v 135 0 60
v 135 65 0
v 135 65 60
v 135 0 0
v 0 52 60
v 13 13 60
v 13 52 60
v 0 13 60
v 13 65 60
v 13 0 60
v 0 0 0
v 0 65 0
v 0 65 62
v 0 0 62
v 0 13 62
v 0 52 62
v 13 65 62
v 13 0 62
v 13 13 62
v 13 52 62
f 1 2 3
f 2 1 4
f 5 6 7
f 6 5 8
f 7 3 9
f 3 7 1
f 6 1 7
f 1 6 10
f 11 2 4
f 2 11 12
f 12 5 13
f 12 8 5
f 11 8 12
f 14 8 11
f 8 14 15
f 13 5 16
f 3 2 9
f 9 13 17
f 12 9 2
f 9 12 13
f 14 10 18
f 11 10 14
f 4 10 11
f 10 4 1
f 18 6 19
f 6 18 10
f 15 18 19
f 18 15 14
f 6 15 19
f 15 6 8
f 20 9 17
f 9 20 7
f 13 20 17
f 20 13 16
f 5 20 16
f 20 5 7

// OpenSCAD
module battery(V=12, AH=7.5) {
    if ((V==12) && (AH==7.5)) {
        color([1,1,1]*0.2) 
            cube([145,65,95]);
        translate([0,0,95])
            color([1,0,0])
                cube([13,13,2]);
        translate([0,65-13,95])
            color([0,0,0])
                cube([13,13,2]);
        name = "Probattery 12V 7.5AH";
        color([1,1,1]) {
            translate([5,0,75]) {
                translate([0,0,0])
                    rotate(90, [1,0,0])
                        text(name);
                translate([130,65,0])
                    rotate(180,[0,0,1])
                        rotate(90, [1,0,0])
                            text(name);
            }
        }
    }
    if ((V==12) && (AH==4.3)) {
        color([1,1,1]*0.2) 
            cube([135,65,60]);
        translate([0,0,60])
            color([1,0,0])
                cube([13,13,2]);
        translate([0,65-13,60])
            color([0,0,0])
                cube([13,13,2]);
        name = "Probattery 12V 4.3AH";
        color([1,1,1]) {
            translate([2,0,45]) {
                translate([0,0,0])
                    rotate(90, [1,0,0])
                        text(name);
                translate([130,65,0])
                    rotate(180,[0,0,1])
                        rotate(90, [1,0,0])
                            text(name);
            }
        }
    }
}

battery(AH=4.3);
